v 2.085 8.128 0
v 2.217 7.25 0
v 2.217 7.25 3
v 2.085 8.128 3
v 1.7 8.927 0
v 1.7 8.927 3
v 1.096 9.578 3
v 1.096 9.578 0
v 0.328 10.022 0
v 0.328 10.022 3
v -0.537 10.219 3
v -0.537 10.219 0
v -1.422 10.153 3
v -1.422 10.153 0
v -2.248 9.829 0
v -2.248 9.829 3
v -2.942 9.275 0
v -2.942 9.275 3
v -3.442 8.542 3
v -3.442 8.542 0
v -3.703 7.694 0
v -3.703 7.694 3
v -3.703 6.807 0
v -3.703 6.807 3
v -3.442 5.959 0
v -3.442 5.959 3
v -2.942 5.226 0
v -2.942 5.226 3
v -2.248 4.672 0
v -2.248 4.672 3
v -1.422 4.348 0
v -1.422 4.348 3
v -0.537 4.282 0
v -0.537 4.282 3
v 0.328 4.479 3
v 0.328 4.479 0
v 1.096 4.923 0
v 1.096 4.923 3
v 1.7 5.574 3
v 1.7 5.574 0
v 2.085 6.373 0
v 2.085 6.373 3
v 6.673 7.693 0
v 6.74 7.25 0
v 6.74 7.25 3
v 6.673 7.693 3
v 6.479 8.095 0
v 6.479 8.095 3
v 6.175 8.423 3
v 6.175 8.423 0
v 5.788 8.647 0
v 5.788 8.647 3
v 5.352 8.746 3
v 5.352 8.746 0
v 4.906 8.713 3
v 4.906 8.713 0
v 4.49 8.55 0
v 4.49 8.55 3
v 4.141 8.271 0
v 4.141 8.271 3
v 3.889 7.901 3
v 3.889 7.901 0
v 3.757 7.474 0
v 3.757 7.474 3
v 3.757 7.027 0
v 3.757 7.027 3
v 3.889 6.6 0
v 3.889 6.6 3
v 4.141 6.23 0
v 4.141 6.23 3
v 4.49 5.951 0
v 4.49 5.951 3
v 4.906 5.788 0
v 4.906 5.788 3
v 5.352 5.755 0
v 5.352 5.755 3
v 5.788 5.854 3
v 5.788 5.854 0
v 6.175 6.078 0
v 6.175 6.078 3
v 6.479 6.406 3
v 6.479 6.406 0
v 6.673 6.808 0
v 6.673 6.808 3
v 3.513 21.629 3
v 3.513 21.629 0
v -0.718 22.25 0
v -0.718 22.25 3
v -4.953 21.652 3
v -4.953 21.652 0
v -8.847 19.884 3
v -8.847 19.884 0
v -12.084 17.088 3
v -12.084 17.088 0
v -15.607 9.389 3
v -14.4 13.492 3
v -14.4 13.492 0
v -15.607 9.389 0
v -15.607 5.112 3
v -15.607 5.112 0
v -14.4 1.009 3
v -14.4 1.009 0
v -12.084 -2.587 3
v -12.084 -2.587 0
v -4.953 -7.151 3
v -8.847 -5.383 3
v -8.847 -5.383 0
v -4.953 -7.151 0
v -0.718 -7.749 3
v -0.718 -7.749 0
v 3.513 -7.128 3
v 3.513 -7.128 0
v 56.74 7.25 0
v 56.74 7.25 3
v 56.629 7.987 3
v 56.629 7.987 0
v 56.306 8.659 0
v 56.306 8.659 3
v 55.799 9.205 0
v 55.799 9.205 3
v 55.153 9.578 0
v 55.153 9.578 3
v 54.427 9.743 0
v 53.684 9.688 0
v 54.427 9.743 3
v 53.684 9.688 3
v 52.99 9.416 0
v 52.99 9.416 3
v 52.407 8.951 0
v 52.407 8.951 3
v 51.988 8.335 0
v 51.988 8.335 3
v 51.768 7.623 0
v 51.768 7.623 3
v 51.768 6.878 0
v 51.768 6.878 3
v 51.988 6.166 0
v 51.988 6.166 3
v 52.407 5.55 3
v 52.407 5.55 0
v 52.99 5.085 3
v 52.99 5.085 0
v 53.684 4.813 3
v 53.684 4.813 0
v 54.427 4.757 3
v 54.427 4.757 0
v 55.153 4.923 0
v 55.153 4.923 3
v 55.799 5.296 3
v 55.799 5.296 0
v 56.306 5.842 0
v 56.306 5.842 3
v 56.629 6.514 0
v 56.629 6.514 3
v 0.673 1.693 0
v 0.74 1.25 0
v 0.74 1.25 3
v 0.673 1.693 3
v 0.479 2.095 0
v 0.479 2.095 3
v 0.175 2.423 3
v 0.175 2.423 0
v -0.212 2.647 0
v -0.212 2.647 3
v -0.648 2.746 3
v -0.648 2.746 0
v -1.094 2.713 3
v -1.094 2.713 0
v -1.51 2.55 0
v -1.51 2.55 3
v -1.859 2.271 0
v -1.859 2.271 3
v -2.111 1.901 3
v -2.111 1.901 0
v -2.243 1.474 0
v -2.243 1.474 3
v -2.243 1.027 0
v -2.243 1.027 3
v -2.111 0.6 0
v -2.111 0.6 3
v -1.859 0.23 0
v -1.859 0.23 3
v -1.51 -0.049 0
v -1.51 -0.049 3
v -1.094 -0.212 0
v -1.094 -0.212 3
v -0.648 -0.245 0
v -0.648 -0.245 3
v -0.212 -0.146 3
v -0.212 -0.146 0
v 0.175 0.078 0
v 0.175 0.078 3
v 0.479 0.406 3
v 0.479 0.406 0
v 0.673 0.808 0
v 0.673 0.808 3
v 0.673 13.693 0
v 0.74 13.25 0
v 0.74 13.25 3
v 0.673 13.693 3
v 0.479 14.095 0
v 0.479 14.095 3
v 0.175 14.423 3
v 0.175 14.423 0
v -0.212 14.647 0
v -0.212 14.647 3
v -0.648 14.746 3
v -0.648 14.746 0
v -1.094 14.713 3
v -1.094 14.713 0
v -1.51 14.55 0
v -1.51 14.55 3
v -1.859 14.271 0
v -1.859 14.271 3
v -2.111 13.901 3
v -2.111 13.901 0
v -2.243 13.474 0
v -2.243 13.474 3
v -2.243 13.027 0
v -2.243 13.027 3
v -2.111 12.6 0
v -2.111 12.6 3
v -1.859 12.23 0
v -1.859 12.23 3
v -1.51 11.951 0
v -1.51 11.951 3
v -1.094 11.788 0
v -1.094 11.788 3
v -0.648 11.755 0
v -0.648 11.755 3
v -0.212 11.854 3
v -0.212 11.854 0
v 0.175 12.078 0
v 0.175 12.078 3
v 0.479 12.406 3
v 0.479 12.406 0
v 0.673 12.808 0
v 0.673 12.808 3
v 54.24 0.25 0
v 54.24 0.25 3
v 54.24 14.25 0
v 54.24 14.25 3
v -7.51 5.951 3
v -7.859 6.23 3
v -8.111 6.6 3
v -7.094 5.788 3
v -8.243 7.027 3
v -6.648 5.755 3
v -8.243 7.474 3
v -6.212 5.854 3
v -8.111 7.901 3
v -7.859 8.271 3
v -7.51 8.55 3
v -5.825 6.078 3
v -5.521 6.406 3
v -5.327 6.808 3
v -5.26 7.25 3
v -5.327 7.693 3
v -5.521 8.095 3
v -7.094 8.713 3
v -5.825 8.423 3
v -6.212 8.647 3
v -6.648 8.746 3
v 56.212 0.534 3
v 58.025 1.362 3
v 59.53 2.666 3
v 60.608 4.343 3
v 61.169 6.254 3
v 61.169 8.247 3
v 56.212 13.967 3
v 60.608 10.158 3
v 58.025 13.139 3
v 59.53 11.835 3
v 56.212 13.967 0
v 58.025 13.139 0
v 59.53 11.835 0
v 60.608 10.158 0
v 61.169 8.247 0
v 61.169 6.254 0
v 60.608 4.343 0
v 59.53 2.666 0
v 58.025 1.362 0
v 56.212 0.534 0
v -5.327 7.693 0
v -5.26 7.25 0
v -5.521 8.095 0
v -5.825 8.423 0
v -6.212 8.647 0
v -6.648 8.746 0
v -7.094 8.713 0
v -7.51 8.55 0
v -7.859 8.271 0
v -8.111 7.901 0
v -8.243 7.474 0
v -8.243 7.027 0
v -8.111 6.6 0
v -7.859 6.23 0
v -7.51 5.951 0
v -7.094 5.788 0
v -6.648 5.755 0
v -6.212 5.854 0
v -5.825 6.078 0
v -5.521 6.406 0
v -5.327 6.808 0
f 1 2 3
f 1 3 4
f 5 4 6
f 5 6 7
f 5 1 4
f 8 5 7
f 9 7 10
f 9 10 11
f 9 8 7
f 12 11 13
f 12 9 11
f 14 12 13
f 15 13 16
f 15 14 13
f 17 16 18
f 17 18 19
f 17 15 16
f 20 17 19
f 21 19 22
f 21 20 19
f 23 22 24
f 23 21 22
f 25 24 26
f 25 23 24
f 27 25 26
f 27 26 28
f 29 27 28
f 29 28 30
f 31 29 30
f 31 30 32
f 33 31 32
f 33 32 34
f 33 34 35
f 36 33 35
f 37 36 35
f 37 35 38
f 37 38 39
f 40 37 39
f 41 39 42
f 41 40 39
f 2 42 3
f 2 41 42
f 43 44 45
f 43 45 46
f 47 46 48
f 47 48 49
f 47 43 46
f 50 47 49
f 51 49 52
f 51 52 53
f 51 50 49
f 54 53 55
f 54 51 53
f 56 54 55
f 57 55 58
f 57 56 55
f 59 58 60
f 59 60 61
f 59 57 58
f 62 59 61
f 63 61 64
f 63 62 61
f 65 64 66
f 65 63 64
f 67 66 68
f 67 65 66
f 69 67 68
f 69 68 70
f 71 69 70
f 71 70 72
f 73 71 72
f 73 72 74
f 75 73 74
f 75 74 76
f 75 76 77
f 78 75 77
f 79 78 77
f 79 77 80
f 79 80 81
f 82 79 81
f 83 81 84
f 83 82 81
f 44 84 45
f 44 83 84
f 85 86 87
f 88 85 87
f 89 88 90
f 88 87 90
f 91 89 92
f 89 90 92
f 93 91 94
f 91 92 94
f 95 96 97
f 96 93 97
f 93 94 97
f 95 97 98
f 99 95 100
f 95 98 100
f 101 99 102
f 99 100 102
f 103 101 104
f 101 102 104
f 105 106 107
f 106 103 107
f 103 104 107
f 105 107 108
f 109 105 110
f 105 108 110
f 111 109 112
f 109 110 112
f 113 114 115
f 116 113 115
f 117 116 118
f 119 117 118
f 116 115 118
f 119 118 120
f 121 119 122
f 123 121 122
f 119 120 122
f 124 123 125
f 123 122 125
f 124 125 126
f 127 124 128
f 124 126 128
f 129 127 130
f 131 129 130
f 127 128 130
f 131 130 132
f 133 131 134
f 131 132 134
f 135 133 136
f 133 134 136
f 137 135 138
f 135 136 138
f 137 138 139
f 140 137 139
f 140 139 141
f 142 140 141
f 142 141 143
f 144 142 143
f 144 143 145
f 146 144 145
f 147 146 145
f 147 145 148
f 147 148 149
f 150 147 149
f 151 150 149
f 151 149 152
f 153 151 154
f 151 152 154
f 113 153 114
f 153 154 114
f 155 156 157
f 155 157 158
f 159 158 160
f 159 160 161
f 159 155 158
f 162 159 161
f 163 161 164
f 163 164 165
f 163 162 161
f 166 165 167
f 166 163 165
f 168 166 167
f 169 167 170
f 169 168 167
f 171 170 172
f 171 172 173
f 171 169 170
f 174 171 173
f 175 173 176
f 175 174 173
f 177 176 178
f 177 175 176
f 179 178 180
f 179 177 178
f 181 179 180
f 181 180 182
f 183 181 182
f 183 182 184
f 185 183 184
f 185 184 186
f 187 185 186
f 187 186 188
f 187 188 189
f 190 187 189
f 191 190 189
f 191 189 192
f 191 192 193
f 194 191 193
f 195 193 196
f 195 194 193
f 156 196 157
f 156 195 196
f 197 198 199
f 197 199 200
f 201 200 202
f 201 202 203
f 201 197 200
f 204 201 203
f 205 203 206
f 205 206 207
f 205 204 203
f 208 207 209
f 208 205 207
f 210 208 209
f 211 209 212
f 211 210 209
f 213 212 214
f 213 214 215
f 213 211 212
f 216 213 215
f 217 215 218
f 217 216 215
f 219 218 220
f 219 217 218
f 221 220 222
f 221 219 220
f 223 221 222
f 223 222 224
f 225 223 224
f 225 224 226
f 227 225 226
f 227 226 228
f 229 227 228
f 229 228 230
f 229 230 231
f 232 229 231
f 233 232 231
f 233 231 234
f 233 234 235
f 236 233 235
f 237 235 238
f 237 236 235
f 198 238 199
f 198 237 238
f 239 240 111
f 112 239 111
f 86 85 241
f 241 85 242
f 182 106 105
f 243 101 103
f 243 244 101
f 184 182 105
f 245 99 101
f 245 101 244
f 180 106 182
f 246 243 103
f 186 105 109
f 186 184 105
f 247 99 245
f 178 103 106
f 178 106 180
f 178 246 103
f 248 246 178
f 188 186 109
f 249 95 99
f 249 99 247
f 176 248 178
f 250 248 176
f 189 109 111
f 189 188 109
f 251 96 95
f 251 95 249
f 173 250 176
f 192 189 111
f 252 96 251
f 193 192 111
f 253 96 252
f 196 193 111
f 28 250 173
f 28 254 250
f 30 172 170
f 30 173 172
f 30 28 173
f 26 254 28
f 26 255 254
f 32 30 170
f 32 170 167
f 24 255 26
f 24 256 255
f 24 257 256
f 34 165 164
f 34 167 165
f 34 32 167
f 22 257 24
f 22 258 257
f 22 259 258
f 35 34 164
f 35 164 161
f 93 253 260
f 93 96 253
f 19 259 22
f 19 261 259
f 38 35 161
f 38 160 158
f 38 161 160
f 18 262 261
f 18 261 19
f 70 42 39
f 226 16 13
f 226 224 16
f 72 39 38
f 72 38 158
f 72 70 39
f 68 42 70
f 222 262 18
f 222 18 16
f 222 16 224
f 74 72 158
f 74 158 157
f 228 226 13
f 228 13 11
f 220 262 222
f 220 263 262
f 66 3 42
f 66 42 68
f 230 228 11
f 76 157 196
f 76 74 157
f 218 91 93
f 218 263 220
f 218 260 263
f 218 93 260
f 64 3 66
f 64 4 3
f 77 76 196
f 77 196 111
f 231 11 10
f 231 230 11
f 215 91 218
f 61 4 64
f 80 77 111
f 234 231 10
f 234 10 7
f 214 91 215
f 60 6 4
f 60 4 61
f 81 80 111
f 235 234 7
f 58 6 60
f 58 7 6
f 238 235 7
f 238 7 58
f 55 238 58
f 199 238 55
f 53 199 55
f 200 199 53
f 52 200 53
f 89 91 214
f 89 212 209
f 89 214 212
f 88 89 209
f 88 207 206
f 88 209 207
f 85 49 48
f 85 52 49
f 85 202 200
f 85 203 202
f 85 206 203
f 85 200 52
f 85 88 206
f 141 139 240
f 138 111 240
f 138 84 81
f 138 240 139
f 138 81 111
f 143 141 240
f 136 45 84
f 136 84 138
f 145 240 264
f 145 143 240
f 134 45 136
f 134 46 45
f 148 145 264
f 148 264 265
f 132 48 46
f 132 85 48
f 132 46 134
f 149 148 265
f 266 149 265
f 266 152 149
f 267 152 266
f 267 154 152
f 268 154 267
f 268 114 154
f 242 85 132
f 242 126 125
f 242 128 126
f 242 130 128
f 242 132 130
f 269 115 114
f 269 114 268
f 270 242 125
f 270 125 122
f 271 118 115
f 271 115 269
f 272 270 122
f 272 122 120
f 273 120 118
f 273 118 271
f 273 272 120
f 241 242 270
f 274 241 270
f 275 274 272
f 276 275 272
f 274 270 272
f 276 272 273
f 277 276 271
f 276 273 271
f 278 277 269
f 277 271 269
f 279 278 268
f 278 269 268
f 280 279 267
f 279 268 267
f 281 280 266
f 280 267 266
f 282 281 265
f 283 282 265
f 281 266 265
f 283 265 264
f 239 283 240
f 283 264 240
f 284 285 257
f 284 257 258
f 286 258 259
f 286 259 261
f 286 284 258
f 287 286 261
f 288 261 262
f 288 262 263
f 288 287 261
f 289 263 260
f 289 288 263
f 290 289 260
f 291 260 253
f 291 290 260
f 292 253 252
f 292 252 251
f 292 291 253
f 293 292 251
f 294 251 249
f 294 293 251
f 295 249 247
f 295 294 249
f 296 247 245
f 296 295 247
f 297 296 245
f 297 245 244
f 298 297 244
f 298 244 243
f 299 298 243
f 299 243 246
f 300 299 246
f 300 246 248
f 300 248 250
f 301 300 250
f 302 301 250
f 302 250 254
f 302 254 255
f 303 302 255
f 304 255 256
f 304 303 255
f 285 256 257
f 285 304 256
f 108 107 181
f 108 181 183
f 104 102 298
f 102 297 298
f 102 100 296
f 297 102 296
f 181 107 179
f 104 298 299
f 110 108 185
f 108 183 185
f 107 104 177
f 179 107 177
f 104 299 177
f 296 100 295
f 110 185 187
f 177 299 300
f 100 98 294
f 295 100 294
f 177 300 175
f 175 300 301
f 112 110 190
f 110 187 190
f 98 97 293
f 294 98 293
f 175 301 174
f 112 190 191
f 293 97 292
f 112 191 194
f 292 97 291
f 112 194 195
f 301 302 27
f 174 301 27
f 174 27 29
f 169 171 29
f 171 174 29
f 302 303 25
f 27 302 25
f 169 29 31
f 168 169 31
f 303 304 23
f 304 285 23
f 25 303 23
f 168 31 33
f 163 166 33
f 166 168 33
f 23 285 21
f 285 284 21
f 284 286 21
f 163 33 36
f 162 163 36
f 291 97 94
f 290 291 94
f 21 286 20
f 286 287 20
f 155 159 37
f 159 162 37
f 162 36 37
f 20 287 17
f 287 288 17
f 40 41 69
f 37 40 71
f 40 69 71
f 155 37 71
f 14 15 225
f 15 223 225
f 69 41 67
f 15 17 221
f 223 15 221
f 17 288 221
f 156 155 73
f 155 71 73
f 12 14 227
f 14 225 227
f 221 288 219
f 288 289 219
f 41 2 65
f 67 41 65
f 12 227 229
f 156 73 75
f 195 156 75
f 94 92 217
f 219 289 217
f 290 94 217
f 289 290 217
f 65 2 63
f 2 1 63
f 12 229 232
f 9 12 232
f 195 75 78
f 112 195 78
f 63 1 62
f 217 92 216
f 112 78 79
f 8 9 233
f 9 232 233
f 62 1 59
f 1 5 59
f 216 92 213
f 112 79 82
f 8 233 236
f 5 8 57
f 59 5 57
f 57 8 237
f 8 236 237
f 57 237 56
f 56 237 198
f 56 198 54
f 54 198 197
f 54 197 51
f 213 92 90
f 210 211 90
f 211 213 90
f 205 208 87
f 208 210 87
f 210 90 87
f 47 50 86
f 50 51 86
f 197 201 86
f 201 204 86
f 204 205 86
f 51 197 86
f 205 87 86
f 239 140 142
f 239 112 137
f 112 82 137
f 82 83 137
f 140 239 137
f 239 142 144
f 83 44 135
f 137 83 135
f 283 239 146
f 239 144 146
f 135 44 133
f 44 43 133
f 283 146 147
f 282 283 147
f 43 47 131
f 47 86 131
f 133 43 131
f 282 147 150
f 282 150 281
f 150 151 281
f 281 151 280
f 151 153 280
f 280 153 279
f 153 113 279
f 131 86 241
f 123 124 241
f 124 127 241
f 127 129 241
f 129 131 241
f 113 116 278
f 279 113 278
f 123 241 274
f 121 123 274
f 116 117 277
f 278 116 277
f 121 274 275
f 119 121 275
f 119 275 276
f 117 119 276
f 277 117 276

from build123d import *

# Parameters (mm, degrees)
SKETCH1_R           = 15
SKETCH1_R_2         = 2.976854353
SKETCH1_R_3         = 1.5
BOSS_EXTRUDE1_DEPTH = 3
SKETCH2_R           = 2.5
BOSS_EXTRUDE2_DEPTH = 3


with BuildPart() as part:
    # Sketch1 → Boss-Extrude1 (new body)
    with BuildSketch(Plane.XY):
        with Locations((-0.759875944, 7.250482965)):
            Circle(SKETCH1_R)
        with Locations((-0.759875944, 7.250482965)):
            Circle(SKETCH1_R_2, mode=Mode.SUBTRACT)
        with Locations((-0.759875944, 13.250482965)):
            Circle(SKETCH1_R_3, mode=Mode.SUBTRACT)
        with Locations((-6.759875944, 7.250482965)):
            Circle(SKETCH1_R_3, mode=Mode.SUBTRACT)
        with Locations((-0.759875944, 1.250482965)):
            Circle(SKETCH1_R_3, mode=Mode.SUBTRACT)
        with Locations((5.240124056, 7.250482965)):
            Circle(SKETCH1_R_3, mode=Mode.SUBTRACT)
    extrude(amount=BOSS_EXTRUDE1_DEPTH)

    # Sketch2 → Boss-Extrude2 (add)
    with BuildSketch(Plane.XY.offset(3)):
        with BuildLine():
            Line((-0.759875944, 22.250482965), (54.240124056, 14.250482965))
            ThreePointArc((54.240124056, 14.250482965), (61.240124056, 7.250482965), (54.240124056, 0.250482965))
            Line((54.240124056, 0.250482965), (-0.759875944, -7.749517035))
            ThreePointArc((-0.759875944, -7.749517035), (8.423325109, 7.250482965), (-0.759875944, 22.250482965))
        make_face()
        with Locations((54.240124056, 7.250482965)):
            Circle(SKETCH2_R, mode=Mode.SUBTRACT)
    extrude(amount=-BOSS_EXTRUDE2_DEPTH)


solid = part.part
